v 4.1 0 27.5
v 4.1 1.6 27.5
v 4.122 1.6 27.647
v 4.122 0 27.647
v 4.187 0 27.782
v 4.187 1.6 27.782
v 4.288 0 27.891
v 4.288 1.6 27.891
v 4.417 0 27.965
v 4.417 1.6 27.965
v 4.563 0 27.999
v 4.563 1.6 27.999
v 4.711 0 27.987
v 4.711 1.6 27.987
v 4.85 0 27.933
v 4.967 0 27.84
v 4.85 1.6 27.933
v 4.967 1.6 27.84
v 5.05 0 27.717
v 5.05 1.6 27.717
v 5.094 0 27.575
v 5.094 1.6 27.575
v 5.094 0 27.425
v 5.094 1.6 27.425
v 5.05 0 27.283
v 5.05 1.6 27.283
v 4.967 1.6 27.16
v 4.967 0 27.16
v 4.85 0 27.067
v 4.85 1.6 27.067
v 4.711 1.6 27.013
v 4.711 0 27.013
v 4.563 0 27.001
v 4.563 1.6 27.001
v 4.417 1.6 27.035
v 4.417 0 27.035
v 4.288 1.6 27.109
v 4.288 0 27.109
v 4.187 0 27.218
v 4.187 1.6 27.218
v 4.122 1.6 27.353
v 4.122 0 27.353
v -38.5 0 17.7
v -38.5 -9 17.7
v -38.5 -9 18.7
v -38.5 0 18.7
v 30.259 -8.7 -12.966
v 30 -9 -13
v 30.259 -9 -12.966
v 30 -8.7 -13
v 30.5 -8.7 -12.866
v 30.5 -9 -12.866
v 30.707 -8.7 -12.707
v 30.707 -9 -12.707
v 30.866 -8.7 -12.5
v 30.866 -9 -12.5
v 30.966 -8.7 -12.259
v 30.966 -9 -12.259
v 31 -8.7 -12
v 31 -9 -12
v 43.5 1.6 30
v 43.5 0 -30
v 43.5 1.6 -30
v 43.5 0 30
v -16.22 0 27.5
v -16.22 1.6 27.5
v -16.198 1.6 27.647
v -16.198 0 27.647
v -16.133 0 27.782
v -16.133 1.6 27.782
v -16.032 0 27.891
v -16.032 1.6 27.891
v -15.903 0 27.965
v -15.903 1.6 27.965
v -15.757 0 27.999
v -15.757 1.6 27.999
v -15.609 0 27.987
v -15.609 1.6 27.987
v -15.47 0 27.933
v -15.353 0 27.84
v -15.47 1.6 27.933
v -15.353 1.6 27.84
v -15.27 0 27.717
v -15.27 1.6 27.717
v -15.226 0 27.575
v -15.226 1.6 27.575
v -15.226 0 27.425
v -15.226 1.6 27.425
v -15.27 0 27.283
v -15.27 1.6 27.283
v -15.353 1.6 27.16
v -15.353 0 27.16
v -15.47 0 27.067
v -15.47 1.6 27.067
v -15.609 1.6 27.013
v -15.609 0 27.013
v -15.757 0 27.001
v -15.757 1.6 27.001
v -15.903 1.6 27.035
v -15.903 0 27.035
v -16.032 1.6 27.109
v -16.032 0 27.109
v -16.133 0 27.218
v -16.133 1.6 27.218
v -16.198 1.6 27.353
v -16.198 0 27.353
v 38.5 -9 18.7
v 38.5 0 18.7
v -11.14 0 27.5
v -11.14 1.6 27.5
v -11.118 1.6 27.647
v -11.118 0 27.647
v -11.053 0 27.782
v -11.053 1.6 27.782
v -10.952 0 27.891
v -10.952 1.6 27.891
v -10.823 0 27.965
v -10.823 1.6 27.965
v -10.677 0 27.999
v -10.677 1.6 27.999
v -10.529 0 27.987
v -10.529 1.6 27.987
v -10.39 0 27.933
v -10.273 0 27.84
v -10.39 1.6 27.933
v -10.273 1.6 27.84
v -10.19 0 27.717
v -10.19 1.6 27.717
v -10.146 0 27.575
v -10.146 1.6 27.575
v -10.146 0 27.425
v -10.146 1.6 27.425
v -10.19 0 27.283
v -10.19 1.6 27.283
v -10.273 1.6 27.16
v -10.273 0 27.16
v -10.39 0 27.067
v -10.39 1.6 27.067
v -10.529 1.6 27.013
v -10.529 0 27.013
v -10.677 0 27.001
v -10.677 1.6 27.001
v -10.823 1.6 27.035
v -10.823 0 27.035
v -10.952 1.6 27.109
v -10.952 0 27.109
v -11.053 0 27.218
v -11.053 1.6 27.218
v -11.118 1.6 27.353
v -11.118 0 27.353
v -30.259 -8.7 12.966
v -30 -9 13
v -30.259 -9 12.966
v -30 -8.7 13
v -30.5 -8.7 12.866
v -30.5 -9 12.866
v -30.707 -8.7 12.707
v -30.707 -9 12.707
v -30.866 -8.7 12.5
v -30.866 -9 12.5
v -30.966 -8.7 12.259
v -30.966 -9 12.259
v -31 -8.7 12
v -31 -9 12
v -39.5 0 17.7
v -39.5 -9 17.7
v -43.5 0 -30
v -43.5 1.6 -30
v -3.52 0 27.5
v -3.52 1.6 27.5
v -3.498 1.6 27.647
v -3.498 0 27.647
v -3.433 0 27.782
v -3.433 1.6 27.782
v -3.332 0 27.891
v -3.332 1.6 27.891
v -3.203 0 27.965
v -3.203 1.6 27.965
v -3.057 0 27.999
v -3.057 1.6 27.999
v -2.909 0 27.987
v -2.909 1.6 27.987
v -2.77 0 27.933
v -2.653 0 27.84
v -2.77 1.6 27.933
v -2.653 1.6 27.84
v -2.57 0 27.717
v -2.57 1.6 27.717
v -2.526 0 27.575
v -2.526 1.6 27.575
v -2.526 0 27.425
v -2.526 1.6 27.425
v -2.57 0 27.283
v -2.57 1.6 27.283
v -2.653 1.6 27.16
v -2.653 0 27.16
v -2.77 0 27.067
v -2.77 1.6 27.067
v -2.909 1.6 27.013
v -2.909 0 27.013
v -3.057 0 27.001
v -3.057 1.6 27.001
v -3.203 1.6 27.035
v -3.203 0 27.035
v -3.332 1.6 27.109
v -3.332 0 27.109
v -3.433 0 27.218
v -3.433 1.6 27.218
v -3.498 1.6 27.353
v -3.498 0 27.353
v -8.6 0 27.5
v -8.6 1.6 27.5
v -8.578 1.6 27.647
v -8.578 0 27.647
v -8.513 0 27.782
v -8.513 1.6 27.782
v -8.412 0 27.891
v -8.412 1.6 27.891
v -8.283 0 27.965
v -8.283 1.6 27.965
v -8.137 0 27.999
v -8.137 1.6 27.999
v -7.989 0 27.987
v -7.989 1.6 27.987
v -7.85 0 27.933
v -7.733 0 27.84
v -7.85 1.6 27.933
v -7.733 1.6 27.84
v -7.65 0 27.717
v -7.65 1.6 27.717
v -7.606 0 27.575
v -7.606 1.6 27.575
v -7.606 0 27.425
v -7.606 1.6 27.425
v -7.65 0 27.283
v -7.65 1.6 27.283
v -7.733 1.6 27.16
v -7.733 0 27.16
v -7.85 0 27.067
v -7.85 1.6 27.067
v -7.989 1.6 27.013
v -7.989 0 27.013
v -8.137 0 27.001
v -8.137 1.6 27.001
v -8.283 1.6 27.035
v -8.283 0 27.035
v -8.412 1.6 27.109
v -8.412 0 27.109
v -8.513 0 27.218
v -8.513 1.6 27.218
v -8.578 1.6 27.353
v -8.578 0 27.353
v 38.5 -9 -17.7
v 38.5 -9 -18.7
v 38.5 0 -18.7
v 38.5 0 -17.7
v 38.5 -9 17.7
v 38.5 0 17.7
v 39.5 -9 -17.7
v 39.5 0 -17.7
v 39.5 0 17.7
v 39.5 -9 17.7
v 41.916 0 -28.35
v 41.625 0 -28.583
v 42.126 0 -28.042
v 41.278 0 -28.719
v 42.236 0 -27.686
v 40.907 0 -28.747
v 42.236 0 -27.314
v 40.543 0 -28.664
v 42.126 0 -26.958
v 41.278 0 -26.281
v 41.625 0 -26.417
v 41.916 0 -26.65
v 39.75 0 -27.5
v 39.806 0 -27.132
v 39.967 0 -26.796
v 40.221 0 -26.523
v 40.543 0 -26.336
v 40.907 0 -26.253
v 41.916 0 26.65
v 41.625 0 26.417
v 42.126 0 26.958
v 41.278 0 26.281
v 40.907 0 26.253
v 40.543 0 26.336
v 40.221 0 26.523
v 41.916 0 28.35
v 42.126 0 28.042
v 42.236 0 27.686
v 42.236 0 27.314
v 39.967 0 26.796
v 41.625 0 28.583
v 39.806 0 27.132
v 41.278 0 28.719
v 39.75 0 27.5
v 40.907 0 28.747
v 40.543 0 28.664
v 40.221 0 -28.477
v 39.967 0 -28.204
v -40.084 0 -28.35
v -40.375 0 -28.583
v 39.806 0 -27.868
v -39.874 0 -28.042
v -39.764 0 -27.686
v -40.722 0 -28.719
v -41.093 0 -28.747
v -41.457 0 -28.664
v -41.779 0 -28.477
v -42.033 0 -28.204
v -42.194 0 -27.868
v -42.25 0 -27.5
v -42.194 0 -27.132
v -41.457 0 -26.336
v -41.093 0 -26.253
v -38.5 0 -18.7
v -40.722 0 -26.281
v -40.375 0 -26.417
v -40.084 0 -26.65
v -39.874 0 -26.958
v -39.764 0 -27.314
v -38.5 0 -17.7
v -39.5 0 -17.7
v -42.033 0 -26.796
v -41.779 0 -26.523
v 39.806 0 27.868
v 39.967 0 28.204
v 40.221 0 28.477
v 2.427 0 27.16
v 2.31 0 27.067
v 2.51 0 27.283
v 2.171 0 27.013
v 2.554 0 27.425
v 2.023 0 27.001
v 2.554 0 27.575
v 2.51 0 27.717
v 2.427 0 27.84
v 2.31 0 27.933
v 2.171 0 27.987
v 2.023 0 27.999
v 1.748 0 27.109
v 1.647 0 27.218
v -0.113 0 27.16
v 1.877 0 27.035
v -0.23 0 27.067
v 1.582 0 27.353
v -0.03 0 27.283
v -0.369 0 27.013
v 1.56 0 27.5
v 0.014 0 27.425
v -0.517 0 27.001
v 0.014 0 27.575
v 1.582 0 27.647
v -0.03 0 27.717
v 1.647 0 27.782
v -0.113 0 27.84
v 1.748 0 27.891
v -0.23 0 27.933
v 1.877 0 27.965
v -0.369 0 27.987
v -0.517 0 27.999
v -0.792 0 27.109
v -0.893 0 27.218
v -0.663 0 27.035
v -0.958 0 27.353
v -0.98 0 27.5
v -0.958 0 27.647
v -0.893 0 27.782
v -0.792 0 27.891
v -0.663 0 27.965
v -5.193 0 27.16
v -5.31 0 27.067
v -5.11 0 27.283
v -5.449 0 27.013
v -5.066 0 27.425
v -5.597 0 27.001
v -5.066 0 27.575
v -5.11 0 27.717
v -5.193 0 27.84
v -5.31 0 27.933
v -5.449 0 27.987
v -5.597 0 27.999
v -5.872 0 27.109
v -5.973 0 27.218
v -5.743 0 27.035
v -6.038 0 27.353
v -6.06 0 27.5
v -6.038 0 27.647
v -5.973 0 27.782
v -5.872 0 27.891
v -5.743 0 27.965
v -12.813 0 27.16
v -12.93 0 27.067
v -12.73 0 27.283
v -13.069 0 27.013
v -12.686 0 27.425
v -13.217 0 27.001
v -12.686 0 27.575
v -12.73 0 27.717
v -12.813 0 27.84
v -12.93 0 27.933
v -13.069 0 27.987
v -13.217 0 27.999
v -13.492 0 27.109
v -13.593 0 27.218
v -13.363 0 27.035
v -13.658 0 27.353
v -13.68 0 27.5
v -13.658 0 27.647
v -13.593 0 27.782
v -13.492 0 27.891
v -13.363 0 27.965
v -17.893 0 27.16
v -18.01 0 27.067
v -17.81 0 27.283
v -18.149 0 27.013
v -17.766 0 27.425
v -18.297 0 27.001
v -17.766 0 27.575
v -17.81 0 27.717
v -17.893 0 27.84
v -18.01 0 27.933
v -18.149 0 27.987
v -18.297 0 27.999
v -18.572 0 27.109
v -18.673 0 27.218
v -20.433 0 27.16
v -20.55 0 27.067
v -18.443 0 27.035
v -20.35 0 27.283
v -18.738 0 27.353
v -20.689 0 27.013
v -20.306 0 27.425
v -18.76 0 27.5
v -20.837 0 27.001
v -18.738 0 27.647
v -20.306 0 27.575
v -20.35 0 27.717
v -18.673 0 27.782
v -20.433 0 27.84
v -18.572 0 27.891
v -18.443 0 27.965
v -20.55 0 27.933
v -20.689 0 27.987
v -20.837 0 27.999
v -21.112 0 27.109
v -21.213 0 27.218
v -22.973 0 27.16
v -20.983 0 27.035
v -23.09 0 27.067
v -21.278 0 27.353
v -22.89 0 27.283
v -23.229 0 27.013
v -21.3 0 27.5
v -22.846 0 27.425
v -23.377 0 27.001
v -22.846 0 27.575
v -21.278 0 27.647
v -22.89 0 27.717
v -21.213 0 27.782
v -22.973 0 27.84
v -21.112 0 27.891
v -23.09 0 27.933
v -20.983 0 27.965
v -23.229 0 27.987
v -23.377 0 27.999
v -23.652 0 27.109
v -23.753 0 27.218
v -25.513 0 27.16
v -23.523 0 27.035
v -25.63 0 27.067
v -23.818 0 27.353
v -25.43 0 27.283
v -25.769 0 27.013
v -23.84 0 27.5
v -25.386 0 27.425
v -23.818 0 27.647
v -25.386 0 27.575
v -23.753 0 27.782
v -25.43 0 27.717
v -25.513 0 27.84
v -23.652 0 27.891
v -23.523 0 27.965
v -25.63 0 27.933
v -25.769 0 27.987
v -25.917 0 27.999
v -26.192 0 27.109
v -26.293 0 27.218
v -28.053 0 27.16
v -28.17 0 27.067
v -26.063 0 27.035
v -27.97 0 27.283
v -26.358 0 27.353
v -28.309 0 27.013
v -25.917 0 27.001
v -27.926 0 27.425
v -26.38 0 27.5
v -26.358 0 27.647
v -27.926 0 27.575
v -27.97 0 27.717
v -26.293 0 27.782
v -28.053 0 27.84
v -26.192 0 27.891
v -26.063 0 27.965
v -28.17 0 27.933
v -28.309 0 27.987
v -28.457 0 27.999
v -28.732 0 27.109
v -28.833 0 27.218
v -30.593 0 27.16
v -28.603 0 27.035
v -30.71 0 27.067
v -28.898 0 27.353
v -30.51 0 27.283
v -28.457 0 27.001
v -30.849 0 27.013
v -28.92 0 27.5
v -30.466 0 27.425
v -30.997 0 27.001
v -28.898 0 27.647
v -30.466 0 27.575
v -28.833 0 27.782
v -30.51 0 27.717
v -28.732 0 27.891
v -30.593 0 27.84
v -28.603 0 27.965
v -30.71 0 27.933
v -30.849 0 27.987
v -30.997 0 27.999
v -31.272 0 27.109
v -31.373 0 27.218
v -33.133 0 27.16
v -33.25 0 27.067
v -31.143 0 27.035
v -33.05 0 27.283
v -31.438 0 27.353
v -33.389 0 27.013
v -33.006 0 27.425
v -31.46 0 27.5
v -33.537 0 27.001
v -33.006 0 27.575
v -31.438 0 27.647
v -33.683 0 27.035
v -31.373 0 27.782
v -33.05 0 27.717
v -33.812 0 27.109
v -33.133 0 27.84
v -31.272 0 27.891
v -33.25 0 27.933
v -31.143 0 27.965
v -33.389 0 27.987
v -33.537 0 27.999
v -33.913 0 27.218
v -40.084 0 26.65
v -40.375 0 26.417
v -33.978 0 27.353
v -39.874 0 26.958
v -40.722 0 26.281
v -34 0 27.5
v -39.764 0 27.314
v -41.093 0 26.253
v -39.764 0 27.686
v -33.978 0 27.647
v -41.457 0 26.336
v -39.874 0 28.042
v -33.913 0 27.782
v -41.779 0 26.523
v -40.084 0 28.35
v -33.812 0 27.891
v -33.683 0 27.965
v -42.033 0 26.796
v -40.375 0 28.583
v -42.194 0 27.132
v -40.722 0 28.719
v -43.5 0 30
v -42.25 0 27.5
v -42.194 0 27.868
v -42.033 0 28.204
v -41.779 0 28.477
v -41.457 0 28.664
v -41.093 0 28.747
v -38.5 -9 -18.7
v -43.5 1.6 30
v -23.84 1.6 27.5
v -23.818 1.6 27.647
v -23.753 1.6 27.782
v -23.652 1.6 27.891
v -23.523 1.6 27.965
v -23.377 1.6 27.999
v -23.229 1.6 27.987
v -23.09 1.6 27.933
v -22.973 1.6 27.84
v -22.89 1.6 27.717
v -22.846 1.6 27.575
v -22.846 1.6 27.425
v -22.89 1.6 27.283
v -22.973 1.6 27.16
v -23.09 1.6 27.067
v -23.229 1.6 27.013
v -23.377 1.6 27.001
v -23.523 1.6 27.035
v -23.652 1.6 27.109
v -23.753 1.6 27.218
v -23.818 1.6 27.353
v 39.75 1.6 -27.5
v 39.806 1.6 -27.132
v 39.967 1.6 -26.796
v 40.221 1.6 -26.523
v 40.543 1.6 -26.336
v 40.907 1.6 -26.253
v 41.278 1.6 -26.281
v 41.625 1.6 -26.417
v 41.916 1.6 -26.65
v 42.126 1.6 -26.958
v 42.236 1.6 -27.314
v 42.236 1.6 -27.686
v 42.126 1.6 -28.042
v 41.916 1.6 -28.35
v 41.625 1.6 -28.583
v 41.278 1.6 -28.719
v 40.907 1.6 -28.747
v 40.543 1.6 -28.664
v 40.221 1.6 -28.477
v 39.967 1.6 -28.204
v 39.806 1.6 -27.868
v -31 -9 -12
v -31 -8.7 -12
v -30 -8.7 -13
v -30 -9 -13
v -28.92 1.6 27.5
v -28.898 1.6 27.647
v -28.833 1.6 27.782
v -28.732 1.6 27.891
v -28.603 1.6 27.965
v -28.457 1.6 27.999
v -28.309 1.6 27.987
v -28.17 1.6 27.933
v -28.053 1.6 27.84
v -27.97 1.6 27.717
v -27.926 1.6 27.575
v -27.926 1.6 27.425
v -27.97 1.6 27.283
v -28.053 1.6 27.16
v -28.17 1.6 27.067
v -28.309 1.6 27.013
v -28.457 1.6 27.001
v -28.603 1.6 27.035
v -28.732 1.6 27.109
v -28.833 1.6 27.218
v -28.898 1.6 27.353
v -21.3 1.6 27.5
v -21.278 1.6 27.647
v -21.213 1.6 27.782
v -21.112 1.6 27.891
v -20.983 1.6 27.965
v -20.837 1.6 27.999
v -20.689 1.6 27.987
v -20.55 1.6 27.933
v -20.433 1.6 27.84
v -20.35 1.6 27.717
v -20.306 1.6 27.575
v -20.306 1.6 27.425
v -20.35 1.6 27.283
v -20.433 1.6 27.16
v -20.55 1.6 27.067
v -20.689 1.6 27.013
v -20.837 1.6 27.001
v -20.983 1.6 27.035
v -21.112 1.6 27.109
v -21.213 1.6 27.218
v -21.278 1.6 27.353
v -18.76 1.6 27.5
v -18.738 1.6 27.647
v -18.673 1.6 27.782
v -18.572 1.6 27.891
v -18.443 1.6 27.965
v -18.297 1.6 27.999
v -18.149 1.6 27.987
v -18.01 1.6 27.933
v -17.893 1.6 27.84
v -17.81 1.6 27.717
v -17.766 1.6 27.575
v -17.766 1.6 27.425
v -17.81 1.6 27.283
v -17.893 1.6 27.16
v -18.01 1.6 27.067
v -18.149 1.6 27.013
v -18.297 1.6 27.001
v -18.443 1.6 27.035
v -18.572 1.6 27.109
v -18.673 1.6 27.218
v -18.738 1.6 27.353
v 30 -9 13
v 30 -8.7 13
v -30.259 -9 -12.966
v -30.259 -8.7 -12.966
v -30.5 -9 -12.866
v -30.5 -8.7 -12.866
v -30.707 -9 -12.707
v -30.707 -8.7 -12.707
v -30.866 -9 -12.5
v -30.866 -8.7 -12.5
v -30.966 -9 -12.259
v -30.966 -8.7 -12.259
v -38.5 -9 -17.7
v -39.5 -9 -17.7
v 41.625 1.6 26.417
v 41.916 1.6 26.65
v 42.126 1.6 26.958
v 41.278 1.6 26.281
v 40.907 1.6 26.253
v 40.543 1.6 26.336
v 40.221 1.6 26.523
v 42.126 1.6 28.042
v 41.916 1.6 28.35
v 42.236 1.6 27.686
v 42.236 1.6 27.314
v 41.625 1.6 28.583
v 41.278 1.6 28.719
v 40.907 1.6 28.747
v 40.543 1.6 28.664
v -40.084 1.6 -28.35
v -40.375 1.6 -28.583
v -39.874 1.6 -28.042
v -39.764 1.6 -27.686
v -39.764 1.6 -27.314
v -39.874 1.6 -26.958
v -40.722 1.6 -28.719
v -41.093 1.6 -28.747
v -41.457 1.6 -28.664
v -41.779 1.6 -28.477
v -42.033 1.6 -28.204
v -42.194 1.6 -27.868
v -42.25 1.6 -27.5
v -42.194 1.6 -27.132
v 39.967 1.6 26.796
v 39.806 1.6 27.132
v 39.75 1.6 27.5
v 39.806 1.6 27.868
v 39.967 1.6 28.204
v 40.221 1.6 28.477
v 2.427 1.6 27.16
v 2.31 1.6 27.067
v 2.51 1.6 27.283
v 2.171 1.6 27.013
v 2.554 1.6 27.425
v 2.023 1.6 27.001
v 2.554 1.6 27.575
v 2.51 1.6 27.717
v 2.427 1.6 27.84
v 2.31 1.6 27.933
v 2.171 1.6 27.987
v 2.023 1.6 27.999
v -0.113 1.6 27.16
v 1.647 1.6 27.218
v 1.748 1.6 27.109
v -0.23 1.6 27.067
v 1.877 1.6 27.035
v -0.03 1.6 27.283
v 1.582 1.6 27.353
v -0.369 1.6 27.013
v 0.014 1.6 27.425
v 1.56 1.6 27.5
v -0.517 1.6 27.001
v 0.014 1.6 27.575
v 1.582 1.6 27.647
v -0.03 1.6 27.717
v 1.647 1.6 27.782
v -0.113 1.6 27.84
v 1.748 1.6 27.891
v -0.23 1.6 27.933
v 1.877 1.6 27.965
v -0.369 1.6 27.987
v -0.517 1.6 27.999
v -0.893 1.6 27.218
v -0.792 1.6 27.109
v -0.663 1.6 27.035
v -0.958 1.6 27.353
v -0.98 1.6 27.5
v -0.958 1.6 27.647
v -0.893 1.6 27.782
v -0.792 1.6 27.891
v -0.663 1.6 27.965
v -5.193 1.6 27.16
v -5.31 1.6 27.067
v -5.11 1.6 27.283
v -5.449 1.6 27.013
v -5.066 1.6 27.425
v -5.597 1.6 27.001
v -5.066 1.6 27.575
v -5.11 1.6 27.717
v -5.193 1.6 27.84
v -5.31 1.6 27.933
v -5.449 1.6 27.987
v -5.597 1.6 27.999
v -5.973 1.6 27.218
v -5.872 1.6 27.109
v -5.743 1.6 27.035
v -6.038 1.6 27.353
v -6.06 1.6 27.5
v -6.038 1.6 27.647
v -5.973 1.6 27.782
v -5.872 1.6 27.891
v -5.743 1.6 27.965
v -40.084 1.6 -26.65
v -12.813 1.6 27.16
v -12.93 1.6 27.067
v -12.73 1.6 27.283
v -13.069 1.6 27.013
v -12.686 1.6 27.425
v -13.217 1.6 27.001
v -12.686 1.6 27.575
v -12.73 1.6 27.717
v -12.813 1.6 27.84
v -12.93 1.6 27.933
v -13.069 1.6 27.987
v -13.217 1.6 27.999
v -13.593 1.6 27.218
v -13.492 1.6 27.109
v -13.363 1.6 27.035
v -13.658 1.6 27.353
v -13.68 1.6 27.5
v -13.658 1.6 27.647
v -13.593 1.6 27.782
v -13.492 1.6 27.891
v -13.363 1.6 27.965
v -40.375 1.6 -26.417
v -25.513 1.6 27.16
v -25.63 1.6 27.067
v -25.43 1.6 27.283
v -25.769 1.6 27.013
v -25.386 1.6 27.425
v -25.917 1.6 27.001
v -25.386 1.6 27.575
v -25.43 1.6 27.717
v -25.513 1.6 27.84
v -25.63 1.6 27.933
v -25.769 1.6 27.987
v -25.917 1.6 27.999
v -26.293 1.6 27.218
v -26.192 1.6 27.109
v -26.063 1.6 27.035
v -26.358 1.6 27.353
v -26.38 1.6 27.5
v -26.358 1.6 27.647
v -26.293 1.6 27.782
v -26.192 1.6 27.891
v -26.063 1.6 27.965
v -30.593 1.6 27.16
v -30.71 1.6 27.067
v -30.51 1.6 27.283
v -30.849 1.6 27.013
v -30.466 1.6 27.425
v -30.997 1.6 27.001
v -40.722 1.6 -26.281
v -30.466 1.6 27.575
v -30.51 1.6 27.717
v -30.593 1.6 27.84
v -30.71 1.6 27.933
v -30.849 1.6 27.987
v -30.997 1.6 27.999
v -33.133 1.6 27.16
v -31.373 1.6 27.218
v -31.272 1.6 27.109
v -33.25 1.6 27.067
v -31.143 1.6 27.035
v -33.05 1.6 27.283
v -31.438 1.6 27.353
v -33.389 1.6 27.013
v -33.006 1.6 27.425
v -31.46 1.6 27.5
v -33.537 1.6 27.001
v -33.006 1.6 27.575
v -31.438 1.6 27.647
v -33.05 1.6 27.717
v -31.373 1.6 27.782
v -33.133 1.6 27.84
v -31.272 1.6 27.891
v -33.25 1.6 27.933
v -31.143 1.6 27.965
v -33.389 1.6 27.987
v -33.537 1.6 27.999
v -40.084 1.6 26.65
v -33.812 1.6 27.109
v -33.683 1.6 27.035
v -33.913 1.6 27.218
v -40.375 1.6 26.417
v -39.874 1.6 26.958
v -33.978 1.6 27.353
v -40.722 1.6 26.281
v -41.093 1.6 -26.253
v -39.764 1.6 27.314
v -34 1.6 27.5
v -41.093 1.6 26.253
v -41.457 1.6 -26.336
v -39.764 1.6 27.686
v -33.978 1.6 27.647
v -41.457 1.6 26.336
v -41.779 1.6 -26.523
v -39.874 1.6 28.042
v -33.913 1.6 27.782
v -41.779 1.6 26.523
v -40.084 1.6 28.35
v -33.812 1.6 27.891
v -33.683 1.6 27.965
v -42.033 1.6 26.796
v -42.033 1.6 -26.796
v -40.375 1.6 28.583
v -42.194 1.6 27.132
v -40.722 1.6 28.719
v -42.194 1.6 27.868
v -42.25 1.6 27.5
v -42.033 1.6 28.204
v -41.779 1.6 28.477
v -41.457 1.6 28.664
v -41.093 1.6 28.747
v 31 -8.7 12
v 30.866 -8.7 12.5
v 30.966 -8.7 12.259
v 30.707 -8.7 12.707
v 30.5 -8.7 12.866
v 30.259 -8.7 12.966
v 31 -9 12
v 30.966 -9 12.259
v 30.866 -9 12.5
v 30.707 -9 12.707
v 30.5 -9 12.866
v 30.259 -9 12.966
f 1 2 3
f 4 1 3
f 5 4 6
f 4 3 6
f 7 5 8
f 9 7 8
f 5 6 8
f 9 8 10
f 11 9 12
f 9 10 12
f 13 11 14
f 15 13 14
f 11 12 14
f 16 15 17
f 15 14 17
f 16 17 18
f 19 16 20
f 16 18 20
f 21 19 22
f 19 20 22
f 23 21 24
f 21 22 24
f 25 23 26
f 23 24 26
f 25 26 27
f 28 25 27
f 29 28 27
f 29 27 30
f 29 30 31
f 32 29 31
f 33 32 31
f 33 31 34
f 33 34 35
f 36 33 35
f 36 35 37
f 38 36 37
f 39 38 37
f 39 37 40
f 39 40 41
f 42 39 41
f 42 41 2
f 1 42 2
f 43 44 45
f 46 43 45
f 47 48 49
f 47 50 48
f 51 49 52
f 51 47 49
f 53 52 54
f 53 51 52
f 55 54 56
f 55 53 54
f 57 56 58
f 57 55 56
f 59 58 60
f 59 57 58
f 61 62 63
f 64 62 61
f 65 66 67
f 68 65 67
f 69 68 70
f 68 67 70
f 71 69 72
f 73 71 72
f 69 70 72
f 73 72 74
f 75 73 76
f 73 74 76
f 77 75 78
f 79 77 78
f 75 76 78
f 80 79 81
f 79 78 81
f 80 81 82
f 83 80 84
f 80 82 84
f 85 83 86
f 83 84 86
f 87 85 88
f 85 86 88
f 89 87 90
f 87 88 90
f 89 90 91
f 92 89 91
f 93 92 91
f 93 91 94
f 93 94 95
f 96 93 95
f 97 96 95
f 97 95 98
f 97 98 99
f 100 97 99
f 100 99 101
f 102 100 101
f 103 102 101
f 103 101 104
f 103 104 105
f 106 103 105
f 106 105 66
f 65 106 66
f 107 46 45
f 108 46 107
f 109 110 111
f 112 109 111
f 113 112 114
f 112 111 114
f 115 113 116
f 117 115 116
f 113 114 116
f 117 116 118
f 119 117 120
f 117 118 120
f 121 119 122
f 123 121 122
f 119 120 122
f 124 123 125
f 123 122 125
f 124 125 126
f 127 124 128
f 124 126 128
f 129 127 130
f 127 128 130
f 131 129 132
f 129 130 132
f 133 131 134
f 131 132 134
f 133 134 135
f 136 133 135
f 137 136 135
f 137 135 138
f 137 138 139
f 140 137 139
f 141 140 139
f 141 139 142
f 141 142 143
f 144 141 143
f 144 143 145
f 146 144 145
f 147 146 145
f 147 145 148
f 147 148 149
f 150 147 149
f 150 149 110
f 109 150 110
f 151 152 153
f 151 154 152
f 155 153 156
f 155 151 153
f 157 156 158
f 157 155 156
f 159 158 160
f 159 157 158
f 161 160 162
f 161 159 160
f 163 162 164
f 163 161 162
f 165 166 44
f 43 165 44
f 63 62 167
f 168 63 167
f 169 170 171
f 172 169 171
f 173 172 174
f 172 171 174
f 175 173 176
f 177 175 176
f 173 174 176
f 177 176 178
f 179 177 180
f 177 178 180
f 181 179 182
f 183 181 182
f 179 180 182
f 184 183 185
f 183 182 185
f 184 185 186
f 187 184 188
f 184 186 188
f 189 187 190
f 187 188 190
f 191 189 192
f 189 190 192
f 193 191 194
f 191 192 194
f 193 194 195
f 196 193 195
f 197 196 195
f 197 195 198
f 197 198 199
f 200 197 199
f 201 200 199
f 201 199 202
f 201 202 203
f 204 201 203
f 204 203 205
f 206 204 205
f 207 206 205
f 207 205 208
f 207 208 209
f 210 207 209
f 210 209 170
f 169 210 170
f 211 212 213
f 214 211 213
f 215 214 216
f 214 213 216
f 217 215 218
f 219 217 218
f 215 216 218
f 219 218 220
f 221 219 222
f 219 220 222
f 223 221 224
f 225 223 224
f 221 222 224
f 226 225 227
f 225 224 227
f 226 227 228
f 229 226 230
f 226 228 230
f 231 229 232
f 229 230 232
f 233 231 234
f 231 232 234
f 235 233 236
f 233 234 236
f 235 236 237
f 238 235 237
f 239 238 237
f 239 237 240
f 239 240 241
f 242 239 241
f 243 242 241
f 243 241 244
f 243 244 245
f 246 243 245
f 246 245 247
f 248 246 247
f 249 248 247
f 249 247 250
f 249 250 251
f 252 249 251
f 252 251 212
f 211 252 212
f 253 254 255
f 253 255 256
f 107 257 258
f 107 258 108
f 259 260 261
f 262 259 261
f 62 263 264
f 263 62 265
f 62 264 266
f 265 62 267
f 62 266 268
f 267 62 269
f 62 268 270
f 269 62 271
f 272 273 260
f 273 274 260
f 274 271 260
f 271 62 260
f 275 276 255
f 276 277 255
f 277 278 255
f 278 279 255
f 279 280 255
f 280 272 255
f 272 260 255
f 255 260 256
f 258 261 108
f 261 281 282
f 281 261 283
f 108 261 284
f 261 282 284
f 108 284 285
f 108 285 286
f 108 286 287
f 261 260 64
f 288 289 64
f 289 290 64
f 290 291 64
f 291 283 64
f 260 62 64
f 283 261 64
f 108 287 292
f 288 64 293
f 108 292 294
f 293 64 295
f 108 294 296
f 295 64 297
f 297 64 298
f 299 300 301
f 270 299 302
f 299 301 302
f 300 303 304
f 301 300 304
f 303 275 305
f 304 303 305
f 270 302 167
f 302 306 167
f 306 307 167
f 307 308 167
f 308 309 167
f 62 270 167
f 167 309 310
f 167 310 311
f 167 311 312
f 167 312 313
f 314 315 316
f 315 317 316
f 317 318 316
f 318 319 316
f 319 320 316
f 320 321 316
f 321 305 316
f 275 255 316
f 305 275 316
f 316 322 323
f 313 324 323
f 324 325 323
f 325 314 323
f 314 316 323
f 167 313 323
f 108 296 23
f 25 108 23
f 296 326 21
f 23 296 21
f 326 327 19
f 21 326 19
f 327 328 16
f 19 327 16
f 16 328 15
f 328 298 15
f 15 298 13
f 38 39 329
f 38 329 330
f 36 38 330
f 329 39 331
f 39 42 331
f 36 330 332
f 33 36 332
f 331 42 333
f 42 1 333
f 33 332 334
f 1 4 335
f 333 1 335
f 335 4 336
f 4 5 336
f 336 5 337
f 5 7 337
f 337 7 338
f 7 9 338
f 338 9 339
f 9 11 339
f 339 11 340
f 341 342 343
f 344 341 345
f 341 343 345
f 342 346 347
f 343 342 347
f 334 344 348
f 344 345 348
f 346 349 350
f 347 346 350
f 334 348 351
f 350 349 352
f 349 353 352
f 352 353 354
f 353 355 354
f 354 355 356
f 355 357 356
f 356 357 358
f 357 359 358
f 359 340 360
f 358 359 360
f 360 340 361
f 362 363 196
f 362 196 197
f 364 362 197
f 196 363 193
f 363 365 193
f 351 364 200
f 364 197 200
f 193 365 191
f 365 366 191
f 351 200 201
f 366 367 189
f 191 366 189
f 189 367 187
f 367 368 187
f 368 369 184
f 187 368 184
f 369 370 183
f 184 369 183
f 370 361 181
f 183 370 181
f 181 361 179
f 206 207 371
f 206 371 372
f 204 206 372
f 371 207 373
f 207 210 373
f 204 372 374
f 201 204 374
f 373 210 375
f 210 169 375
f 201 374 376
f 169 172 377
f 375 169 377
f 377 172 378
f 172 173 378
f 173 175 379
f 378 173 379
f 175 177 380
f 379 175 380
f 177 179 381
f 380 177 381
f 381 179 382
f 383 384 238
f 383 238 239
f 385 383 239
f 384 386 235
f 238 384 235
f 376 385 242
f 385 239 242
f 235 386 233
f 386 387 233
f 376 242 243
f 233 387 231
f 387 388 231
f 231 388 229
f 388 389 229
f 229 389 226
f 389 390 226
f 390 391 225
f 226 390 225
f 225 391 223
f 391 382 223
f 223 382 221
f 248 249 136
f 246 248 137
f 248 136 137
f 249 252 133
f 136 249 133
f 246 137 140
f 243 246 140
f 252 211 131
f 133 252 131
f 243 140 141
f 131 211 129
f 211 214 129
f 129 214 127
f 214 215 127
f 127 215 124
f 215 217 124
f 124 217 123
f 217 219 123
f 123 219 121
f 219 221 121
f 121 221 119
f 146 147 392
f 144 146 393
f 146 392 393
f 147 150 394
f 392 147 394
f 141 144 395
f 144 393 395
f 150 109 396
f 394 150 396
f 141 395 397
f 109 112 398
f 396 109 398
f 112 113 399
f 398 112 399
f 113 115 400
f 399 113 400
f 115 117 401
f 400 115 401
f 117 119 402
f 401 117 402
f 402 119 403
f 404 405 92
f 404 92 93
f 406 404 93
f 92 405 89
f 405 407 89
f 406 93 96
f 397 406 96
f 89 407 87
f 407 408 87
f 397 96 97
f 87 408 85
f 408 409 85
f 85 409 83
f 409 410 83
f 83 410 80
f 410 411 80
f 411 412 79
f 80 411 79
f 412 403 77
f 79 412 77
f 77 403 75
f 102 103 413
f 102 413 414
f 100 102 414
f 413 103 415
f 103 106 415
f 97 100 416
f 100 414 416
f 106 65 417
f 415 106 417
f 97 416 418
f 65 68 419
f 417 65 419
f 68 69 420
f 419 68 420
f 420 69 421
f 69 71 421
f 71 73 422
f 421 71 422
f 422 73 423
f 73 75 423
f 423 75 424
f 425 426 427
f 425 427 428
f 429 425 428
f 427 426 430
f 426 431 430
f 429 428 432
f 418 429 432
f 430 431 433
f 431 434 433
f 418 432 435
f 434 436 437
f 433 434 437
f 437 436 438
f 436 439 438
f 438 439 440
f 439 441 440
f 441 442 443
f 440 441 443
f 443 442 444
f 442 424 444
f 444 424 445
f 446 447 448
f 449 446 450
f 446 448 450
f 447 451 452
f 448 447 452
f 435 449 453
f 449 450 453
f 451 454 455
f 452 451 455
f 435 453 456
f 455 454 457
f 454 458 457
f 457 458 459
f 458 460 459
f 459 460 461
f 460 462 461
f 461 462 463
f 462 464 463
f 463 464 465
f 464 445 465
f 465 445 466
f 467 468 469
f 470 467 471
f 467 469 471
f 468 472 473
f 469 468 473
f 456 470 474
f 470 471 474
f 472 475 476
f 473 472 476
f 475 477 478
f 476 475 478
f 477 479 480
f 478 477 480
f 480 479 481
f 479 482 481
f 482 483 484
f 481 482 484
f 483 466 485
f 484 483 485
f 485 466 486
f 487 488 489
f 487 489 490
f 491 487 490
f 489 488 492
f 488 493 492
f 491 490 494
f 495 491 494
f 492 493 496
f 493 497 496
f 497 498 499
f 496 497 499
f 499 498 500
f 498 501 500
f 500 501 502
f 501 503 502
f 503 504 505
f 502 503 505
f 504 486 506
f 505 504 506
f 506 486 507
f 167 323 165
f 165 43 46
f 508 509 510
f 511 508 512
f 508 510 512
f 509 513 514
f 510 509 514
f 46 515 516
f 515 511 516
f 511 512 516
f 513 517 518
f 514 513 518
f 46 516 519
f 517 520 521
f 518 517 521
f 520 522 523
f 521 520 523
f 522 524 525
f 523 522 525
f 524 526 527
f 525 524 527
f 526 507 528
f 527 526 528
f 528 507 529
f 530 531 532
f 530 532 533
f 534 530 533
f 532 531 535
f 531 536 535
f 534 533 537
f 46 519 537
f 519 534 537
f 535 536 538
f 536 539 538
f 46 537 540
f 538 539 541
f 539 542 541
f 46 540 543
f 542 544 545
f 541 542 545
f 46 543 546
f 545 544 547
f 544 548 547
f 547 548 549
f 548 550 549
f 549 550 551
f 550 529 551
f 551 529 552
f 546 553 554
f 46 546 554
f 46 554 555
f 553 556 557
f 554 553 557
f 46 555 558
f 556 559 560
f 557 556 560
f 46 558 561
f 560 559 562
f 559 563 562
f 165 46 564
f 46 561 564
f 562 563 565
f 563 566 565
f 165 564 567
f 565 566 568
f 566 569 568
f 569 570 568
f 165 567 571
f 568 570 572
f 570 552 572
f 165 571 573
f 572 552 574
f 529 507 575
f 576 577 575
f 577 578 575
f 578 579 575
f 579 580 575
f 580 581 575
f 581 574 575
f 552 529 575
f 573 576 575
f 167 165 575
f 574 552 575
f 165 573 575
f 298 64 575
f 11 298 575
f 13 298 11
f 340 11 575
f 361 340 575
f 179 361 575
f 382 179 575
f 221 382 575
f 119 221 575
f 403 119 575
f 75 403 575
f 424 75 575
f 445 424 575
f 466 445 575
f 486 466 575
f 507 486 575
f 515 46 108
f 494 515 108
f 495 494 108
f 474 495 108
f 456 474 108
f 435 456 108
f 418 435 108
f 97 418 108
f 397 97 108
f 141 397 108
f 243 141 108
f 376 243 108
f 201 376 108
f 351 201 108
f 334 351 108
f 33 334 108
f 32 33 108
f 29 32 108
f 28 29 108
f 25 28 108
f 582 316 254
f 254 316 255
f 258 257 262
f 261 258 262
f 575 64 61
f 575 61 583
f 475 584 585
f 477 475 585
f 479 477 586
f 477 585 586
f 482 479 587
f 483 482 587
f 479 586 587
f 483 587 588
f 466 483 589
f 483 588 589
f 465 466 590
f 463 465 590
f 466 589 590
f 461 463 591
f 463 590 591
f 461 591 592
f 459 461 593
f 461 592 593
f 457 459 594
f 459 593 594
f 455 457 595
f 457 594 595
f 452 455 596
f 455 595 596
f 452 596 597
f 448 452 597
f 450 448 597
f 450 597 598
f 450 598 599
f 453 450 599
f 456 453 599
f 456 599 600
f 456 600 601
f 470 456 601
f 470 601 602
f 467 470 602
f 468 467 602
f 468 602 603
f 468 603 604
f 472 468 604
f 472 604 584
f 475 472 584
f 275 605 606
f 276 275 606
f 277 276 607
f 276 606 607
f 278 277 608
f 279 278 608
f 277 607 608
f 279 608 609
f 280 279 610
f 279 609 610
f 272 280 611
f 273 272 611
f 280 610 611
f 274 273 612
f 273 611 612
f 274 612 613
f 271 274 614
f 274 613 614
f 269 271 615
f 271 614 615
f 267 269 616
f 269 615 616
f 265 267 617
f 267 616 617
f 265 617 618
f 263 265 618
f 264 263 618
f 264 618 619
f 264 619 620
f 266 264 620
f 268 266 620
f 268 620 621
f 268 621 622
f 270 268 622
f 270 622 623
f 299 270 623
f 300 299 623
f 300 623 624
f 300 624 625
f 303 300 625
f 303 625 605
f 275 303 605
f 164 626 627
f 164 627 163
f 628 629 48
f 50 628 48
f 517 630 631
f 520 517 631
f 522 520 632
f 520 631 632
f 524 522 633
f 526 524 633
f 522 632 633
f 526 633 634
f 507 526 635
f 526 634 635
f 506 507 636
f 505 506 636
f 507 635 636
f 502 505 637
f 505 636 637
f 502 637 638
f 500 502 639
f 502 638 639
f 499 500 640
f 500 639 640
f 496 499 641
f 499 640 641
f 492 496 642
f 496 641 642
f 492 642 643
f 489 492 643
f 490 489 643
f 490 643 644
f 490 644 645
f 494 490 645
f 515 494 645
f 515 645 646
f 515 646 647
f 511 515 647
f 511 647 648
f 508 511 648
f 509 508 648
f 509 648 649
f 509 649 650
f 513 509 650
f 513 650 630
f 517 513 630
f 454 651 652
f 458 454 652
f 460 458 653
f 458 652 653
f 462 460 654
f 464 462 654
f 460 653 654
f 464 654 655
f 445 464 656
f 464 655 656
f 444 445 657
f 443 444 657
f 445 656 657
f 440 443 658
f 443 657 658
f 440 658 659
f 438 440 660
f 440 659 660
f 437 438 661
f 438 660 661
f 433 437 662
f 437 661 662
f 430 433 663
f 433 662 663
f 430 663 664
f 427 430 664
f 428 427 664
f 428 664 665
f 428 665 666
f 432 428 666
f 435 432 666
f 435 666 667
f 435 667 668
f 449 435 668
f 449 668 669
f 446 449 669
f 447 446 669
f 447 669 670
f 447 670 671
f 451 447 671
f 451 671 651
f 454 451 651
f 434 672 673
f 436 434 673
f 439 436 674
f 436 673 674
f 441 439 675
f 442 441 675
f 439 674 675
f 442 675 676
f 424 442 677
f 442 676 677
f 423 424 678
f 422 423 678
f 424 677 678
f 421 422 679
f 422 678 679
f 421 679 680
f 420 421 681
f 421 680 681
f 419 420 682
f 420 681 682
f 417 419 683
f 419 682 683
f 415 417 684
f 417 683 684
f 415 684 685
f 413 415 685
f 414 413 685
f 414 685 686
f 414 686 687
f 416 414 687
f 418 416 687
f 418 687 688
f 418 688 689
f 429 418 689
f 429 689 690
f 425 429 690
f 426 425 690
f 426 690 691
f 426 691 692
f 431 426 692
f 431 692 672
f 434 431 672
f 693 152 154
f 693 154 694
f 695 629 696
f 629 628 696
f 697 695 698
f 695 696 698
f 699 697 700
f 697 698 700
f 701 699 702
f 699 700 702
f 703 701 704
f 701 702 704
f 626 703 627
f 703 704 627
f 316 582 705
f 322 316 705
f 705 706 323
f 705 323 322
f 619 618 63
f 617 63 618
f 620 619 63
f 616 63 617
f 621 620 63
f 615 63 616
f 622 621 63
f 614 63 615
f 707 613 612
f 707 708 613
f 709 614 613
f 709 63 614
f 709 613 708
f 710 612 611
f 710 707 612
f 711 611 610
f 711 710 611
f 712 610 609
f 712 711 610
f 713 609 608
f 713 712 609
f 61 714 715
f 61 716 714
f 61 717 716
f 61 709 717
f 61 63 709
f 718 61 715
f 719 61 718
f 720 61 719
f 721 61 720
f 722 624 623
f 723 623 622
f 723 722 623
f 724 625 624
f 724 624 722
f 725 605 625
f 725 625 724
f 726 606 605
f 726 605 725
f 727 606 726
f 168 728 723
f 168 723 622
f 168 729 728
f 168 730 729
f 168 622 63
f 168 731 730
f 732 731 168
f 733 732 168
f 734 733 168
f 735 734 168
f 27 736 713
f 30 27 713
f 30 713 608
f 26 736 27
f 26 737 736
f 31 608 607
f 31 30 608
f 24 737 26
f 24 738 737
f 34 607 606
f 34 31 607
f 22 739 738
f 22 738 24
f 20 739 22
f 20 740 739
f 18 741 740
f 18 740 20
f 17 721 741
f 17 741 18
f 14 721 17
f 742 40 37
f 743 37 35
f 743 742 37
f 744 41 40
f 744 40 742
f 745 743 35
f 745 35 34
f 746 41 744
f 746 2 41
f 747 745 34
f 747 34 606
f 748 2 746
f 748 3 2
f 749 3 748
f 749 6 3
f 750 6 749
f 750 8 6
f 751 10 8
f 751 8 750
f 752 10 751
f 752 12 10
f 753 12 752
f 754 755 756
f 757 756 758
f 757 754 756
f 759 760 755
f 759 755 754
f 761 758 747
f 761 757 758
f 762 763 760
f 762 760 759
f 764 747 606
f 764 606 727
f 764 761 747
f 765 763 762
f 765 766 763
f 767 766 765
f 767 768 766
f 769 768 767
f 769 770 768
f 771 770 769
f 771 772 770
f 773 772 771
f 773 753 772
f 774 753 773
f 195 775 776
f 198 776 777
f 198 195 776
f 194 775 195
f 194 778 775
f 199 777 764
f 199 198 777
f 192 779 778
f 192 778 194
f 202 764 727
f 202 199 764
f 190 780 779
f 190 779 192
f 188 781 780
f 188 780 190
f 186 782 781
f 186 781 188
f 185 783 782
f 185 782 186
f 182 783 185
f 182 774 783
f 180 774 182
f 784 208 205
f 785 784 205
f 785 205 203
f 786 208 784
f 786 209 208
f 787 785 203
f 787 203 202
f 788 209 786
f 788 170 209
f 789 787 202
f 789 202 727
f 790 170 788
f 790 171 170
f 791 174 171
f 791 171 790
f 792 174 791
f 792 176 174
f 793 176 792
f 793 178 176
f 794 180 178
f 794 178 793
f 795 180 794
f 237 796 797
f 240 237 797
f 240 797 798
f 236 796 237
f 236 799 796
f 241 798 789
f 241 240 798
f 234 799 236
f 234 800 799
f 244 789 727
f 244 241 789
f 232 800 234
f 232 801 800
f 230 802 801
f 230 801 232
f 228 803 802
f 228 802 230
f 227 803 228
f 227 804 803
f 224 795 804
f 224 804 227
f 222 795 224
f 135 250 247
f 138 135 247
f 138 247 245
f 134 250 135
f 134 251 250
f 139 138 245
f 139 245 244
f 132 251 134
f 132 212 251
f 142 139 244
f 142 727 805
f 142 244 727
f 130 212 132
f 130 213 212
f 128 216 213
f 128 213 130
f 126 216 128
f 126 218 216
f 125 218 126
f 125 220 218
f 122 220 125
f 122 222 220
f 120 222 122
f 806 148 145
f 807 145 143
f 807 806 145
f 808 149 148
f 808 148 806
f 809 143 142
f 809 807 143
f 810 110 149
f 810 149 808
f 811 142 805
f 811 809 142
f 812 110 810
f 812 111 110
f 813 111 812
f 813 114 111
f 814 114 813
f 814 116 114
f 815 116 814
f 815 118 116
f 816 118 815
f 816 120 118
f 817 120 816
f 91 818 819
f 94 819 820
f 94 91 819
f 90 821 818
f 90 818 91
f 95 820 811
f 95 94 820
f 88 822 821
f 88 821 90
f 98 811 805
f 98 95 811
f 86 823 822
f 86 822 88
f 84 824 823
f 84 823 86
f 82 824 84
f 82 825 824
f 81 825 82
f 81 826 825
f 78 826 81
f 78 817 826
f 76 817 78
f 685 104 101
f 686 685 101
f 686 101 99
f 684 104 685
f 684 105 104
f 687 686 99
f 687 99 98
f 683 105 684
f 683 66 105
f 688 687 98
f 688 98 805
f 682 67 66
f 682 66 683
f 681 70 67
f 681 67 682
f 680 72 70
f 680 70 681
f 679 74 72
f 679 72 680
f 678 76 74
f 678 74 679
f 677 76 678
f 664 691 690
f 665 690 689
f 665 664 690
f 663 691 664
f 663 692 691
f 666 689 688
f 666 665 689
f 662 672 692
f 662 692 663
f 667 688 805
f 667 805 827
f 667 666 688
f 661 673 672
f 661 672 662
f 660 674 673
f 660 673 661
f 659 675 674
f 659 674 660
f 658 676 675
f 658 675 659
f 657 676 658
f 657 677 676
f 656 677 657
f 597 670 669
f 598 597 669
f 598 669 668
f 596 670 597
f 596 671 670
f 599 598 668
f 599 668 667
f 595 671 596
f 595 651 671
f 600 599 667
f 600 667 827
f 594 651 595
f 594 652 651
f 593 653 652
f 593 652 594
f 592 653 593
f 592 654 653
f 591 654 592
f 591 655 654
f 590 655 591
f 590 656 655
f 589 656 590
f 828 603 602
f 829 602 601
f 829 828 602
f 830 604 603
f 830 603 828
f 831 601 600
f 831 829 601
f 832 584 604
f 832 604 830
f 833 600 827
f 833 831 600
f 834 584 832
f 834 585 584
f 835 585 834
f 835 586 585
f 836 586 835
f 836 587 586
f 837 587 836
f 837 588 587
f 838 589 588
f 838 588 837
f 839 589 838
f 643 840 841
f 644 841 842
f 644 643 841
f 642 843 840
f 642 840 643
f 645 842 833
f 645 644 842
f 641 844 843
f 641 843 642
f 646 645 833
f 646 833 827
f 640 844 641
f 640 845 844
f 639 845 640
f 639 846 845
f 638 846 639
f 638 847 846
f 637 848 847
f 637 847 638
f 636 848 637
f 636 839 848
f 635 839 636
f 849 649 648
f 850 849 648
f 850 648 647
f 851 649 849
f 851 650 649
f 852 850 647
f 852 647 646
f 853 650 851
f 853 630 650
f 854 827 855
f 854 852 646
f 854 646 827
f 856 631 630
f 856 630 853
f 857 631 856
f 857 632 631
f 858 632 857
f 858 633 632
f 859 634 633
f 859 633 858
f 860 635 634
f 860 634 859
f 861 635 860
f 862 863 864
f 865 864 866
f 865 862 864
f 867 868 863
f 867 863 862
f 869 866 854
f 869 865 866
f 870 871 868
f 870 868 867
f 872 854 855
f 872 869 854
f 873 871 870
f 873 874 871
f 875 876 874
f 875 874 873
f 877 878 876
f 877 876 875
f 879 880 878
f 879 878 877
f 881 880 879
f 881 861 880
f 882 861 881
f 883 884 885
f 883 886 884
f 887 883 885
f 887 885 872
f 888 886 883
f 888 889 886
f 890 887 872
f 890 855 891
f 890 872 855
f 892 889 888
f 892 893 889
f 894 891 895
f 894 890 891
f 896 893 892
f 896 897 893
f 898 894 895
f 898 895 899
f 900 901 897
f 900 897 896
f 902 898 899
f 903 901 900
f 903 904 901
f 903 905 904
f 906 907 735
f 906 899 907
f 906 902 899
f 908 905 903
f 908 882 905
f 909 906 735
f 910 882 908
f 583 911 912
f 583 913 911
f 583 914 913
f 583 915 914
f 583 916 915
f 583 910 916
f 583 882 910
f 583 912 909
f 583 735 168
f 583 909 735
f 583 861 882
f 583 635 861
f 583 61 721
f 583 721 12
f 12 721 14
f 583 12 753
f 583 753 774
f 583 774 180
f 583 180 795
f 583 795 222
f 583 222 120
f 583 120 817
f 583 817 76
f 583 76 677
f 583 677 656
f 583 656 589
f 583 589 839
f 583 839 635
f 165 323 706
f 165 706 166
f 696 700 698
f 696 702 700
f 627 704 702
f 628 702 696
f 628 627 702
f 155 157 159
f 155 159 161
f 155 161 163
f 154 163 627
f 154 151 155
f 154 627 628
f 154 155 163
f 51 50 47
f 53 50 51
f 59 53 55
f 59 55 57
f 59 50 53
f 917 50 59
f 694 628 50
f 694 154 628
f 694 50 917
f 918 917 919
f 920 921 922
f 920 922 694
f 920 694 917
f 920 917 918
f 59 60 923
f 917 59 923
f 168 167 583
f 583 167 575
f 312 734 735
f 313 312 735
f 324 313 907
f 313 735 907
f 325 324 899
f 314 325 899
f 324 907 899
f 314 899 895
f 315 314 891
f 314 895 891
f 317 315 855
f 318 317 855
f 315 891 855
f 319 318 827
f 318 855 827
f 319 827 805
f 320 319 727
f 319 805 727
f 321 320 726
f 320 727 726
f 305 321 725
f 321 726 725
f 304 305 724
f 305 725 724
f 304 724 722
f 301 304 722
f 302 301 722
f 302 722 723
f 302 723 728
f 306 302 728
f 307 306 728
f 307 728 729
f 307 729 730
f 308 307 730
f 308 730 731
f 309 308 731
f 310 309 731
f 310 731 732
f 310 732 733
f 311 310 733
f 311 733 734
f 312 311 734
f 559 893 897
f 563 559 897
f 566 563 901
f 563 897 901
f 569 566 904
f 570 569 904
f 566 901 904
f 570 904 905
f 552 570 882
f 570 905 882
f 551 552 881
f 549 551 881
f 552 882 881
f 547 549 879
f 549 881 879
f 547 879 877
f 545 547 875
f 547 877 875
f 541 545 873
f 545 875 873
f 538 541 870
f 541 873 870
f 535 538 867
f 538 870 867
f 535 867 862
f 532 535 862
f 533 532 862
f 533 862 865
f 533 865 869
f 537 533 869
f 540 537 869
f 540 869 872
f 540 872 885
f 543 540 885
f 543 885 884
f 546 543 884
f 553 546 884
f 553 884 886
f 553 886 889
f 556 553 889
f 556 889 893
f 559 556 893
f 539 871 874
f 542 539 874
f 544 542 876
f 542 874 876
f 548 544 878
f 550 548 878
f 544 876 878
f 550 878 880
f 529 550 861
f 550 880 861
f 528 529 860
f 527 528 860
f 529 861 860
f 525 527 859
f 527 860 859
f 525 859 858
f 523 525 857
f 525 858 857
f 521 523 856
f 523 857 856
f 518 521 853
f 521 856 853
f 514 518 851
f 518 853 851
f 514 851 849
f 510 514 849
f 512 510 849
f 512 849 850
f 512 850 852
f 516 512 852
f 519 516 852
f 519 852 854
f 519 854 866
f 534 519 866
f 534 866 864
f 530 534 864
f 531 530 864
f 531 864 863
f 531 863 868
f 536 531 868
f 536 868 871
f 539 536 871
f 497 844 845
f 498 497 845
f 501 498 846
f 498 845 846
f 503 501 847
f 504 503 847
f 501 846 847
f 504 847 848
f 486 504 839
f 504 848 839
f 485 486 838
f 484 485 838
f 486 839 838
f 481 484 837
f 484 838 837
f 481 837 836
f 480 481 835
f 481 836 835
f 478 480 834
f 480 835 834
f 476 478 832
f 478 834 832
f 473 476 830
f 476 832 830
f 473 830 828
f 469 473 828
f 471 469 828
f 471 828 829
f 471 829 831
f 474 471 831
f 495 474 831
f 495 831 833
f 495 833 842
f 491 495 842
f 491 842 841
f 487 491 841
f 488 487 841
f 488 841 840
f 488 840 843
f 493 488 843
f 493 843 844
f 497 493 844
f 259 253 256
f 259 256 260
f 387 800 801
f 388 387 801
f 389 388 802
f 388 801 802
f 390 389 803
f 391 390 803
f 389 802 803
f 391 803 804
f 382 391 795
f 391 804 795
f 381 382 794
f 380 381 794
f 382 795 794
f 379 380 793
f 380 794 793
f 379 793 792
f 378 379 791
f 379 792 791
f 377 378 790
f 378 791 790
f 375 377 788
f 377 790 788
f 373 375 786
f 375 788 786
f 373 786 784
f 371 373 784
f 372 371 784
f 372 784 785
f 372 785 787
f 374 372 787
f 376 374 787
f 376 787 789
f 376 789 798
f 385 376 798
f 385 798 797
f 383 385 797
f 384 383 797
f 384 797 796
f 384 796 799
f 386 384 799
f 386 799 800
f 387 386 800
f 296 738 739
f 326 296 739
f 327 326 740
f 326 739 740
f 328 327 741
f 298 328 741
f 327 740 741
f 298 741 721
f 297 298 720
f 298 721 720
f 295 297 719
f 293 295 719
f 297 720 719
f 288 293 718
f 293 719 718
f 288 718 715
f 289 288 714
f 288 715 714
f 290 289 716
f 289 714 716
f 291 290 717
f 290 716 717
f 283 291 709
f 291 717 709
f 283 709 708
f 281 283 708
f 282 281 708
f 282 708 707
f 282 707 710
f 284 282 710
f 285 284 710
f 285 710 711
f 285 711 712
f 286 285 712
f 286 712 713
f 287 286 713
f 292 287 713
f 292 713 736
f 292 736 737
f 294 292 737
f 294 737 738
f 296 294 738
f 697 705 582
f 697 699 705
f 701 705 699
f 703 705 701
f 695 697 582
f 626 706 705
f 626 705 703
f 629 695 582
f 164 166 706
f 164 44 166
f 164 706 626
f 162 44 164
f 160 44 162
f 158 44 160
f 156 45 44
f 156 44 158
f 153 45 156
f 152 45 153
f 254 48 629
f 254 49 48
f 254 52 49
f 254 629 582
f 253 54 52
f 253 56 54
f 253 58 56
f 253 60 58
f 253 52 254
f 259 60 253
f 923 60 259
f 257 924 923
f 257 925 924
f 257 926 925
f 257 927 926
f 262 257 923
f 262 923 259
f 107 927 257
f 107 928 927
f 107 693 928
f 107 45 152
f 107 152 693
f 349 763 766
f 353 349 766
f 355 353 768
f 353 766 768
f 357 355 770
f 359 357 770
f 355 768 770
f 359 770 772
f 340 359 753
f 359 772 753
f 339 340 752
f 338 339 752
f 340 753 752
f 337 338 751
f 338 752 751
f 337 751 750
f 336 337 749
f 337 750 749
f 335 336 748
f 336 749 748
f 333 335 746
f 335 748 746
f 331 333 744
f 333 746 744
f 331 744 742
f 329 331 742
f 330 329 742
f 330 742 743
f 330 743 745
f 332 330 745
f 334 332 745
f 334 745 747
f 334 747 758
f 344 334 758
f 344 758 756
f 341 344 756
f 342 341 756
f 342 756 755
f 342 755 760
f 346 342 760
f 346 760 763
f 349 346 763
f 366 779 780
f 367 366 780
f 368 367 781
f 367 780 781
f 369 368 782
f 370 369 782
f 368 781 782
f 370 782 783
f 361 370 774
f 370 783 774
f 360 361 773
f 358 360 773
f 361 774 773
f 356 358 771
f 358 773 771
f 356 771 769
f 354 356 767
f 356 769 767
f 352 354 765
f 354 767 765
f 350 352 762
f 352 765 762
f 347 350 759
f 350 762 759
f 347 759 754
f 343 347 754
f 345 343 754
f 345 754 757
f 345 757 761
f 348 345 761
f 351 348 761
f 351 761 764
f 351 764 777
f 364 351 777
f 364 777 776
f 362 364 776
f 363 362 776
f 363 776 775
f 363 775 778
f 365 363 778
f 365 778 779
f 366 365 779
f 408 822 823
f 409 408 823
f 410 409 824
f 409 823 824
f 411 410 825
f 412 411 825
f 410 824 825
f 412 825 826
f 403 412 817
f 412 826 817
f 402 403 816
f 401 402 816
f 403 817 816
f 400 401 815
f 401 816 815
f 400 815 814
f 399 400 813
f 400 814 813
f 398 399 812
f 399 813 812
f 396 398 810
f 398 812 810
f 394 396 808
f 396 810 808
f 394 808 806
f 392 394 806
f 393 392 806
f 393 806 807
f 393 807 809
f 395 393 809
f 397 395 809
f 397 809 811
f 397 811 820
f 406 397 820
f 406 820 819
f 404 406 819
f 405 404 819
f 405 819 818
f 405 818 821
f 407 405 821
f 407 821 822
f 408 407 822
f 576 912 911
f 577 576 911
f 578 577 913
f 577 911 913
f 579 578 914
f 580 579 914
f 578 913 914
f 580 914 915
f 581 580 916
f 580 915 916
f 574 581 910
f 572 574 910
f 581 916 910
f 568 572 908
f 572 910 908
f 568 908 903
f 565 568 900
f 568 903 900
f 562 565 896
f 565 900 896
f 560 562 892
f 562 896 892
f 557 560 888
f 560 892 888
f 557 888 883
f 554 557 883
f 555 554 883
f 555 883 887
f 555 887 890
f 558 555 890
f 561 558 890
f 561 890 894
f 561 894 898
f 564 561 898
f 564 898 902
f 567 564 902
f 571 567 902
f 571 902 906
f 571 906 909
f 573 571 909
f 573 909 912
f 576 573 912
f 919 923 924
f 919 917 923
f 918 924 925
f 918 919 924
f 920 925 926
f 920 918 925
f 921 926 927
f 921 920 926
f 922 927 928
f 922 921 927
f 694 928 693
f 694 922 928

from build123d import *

# Parameters (mm, degrees)
F0_W     = 79
F0_H     = 37.4
F1_DEPTH = 9
F2_W     = 62
F2_H     = 26
F3_DEPTH = 0.3
F4_R     = 1
F5_W     = 1
F5_H     = 1
F6_DEPTH = 25.4
F7_W     = 87
F7_H     = 60
F8_DEPTH = 1.6
F10_D    = 2.5
F12_D    = 1


with BuildPart() as f1:
    # F0 (on Front) → F1 (new body)
    with BuildSketch(Plane.XZ):
        Rectangle(F0_W, F0_H)
    extrude(amount=F1_DEPTH)

    # F2 (on face) → F3 (cut)
    with BuildSketch(Plane.XZ.offset(9)):
        Rectangle(F2_W, F2_H)
    extrude(amount=-F3_DEPTH, mode=Mode.SUBTRACT)

    # F4
    f4_edges = [f1.edges().sort_by_distance(p)[0] for p in [
        (-31, -8.85, 13),
        (31, -8.85, 13),
        (31, -8.85, -13),
        (-31, -8.85, -13),
    ]]
    fillet(f4_edges, radius=F4_R)

    # F5 (on face) → F6 (cut)
    with BuildSketch(Plane.XZ.offset(9)):
        with Locations((-39, -18.2)):
            Rectangle(F5_W, F5_H)
        with Locations((39, -18.2)):
            Rectangle(F5_W, F5_H)
        with Locations((39, 18.2)):
            Rectangle(F5_W, F5_H)
        with Locations((-39, 18.2)):
            Rectangle(F5_W, F5_H)
    extrude(amount=-F6_DEPTH, mode=Mode.SUBTRACT)

    # F7 (on face) → F8 (join)
    with BuildSketch(Plane(origin=(0, 0, 0), x_dir=(-1, 0, 0), z_dir=(0, 1, 0))):
        Rectangle(F7_W, F7_H)
    extrude(amount=F8_DEPTH)

    # F10 (through all)
    with Locations(Plane.XZ):
        with Locations((-41, 27.5), (-41, -27.5), (41, 27.5), (41, -27.5)):
            Hole(F10_D / 2)

    # F12 (through all)
    with Locations(Plane.XZ):
        with Locations((-33.5, 27.5), (-30.96, 27.5), (-28.42, 27.5), (-25.88, 27.5), (-23.34, 27.5), (-20.8, 27.5), (-18.26, 27.5), (-15.72, 27.5), (-13.18, 27.5), (-10.64, 27.5), (-8.1, 27.5), (-5.56, 27.5), (-3.02, 27.5), (-0.48, 27.5), (2.06, 27.5), (4.6, 27.5)):
            Hole(F12_D / 2)


solid = f1.part
